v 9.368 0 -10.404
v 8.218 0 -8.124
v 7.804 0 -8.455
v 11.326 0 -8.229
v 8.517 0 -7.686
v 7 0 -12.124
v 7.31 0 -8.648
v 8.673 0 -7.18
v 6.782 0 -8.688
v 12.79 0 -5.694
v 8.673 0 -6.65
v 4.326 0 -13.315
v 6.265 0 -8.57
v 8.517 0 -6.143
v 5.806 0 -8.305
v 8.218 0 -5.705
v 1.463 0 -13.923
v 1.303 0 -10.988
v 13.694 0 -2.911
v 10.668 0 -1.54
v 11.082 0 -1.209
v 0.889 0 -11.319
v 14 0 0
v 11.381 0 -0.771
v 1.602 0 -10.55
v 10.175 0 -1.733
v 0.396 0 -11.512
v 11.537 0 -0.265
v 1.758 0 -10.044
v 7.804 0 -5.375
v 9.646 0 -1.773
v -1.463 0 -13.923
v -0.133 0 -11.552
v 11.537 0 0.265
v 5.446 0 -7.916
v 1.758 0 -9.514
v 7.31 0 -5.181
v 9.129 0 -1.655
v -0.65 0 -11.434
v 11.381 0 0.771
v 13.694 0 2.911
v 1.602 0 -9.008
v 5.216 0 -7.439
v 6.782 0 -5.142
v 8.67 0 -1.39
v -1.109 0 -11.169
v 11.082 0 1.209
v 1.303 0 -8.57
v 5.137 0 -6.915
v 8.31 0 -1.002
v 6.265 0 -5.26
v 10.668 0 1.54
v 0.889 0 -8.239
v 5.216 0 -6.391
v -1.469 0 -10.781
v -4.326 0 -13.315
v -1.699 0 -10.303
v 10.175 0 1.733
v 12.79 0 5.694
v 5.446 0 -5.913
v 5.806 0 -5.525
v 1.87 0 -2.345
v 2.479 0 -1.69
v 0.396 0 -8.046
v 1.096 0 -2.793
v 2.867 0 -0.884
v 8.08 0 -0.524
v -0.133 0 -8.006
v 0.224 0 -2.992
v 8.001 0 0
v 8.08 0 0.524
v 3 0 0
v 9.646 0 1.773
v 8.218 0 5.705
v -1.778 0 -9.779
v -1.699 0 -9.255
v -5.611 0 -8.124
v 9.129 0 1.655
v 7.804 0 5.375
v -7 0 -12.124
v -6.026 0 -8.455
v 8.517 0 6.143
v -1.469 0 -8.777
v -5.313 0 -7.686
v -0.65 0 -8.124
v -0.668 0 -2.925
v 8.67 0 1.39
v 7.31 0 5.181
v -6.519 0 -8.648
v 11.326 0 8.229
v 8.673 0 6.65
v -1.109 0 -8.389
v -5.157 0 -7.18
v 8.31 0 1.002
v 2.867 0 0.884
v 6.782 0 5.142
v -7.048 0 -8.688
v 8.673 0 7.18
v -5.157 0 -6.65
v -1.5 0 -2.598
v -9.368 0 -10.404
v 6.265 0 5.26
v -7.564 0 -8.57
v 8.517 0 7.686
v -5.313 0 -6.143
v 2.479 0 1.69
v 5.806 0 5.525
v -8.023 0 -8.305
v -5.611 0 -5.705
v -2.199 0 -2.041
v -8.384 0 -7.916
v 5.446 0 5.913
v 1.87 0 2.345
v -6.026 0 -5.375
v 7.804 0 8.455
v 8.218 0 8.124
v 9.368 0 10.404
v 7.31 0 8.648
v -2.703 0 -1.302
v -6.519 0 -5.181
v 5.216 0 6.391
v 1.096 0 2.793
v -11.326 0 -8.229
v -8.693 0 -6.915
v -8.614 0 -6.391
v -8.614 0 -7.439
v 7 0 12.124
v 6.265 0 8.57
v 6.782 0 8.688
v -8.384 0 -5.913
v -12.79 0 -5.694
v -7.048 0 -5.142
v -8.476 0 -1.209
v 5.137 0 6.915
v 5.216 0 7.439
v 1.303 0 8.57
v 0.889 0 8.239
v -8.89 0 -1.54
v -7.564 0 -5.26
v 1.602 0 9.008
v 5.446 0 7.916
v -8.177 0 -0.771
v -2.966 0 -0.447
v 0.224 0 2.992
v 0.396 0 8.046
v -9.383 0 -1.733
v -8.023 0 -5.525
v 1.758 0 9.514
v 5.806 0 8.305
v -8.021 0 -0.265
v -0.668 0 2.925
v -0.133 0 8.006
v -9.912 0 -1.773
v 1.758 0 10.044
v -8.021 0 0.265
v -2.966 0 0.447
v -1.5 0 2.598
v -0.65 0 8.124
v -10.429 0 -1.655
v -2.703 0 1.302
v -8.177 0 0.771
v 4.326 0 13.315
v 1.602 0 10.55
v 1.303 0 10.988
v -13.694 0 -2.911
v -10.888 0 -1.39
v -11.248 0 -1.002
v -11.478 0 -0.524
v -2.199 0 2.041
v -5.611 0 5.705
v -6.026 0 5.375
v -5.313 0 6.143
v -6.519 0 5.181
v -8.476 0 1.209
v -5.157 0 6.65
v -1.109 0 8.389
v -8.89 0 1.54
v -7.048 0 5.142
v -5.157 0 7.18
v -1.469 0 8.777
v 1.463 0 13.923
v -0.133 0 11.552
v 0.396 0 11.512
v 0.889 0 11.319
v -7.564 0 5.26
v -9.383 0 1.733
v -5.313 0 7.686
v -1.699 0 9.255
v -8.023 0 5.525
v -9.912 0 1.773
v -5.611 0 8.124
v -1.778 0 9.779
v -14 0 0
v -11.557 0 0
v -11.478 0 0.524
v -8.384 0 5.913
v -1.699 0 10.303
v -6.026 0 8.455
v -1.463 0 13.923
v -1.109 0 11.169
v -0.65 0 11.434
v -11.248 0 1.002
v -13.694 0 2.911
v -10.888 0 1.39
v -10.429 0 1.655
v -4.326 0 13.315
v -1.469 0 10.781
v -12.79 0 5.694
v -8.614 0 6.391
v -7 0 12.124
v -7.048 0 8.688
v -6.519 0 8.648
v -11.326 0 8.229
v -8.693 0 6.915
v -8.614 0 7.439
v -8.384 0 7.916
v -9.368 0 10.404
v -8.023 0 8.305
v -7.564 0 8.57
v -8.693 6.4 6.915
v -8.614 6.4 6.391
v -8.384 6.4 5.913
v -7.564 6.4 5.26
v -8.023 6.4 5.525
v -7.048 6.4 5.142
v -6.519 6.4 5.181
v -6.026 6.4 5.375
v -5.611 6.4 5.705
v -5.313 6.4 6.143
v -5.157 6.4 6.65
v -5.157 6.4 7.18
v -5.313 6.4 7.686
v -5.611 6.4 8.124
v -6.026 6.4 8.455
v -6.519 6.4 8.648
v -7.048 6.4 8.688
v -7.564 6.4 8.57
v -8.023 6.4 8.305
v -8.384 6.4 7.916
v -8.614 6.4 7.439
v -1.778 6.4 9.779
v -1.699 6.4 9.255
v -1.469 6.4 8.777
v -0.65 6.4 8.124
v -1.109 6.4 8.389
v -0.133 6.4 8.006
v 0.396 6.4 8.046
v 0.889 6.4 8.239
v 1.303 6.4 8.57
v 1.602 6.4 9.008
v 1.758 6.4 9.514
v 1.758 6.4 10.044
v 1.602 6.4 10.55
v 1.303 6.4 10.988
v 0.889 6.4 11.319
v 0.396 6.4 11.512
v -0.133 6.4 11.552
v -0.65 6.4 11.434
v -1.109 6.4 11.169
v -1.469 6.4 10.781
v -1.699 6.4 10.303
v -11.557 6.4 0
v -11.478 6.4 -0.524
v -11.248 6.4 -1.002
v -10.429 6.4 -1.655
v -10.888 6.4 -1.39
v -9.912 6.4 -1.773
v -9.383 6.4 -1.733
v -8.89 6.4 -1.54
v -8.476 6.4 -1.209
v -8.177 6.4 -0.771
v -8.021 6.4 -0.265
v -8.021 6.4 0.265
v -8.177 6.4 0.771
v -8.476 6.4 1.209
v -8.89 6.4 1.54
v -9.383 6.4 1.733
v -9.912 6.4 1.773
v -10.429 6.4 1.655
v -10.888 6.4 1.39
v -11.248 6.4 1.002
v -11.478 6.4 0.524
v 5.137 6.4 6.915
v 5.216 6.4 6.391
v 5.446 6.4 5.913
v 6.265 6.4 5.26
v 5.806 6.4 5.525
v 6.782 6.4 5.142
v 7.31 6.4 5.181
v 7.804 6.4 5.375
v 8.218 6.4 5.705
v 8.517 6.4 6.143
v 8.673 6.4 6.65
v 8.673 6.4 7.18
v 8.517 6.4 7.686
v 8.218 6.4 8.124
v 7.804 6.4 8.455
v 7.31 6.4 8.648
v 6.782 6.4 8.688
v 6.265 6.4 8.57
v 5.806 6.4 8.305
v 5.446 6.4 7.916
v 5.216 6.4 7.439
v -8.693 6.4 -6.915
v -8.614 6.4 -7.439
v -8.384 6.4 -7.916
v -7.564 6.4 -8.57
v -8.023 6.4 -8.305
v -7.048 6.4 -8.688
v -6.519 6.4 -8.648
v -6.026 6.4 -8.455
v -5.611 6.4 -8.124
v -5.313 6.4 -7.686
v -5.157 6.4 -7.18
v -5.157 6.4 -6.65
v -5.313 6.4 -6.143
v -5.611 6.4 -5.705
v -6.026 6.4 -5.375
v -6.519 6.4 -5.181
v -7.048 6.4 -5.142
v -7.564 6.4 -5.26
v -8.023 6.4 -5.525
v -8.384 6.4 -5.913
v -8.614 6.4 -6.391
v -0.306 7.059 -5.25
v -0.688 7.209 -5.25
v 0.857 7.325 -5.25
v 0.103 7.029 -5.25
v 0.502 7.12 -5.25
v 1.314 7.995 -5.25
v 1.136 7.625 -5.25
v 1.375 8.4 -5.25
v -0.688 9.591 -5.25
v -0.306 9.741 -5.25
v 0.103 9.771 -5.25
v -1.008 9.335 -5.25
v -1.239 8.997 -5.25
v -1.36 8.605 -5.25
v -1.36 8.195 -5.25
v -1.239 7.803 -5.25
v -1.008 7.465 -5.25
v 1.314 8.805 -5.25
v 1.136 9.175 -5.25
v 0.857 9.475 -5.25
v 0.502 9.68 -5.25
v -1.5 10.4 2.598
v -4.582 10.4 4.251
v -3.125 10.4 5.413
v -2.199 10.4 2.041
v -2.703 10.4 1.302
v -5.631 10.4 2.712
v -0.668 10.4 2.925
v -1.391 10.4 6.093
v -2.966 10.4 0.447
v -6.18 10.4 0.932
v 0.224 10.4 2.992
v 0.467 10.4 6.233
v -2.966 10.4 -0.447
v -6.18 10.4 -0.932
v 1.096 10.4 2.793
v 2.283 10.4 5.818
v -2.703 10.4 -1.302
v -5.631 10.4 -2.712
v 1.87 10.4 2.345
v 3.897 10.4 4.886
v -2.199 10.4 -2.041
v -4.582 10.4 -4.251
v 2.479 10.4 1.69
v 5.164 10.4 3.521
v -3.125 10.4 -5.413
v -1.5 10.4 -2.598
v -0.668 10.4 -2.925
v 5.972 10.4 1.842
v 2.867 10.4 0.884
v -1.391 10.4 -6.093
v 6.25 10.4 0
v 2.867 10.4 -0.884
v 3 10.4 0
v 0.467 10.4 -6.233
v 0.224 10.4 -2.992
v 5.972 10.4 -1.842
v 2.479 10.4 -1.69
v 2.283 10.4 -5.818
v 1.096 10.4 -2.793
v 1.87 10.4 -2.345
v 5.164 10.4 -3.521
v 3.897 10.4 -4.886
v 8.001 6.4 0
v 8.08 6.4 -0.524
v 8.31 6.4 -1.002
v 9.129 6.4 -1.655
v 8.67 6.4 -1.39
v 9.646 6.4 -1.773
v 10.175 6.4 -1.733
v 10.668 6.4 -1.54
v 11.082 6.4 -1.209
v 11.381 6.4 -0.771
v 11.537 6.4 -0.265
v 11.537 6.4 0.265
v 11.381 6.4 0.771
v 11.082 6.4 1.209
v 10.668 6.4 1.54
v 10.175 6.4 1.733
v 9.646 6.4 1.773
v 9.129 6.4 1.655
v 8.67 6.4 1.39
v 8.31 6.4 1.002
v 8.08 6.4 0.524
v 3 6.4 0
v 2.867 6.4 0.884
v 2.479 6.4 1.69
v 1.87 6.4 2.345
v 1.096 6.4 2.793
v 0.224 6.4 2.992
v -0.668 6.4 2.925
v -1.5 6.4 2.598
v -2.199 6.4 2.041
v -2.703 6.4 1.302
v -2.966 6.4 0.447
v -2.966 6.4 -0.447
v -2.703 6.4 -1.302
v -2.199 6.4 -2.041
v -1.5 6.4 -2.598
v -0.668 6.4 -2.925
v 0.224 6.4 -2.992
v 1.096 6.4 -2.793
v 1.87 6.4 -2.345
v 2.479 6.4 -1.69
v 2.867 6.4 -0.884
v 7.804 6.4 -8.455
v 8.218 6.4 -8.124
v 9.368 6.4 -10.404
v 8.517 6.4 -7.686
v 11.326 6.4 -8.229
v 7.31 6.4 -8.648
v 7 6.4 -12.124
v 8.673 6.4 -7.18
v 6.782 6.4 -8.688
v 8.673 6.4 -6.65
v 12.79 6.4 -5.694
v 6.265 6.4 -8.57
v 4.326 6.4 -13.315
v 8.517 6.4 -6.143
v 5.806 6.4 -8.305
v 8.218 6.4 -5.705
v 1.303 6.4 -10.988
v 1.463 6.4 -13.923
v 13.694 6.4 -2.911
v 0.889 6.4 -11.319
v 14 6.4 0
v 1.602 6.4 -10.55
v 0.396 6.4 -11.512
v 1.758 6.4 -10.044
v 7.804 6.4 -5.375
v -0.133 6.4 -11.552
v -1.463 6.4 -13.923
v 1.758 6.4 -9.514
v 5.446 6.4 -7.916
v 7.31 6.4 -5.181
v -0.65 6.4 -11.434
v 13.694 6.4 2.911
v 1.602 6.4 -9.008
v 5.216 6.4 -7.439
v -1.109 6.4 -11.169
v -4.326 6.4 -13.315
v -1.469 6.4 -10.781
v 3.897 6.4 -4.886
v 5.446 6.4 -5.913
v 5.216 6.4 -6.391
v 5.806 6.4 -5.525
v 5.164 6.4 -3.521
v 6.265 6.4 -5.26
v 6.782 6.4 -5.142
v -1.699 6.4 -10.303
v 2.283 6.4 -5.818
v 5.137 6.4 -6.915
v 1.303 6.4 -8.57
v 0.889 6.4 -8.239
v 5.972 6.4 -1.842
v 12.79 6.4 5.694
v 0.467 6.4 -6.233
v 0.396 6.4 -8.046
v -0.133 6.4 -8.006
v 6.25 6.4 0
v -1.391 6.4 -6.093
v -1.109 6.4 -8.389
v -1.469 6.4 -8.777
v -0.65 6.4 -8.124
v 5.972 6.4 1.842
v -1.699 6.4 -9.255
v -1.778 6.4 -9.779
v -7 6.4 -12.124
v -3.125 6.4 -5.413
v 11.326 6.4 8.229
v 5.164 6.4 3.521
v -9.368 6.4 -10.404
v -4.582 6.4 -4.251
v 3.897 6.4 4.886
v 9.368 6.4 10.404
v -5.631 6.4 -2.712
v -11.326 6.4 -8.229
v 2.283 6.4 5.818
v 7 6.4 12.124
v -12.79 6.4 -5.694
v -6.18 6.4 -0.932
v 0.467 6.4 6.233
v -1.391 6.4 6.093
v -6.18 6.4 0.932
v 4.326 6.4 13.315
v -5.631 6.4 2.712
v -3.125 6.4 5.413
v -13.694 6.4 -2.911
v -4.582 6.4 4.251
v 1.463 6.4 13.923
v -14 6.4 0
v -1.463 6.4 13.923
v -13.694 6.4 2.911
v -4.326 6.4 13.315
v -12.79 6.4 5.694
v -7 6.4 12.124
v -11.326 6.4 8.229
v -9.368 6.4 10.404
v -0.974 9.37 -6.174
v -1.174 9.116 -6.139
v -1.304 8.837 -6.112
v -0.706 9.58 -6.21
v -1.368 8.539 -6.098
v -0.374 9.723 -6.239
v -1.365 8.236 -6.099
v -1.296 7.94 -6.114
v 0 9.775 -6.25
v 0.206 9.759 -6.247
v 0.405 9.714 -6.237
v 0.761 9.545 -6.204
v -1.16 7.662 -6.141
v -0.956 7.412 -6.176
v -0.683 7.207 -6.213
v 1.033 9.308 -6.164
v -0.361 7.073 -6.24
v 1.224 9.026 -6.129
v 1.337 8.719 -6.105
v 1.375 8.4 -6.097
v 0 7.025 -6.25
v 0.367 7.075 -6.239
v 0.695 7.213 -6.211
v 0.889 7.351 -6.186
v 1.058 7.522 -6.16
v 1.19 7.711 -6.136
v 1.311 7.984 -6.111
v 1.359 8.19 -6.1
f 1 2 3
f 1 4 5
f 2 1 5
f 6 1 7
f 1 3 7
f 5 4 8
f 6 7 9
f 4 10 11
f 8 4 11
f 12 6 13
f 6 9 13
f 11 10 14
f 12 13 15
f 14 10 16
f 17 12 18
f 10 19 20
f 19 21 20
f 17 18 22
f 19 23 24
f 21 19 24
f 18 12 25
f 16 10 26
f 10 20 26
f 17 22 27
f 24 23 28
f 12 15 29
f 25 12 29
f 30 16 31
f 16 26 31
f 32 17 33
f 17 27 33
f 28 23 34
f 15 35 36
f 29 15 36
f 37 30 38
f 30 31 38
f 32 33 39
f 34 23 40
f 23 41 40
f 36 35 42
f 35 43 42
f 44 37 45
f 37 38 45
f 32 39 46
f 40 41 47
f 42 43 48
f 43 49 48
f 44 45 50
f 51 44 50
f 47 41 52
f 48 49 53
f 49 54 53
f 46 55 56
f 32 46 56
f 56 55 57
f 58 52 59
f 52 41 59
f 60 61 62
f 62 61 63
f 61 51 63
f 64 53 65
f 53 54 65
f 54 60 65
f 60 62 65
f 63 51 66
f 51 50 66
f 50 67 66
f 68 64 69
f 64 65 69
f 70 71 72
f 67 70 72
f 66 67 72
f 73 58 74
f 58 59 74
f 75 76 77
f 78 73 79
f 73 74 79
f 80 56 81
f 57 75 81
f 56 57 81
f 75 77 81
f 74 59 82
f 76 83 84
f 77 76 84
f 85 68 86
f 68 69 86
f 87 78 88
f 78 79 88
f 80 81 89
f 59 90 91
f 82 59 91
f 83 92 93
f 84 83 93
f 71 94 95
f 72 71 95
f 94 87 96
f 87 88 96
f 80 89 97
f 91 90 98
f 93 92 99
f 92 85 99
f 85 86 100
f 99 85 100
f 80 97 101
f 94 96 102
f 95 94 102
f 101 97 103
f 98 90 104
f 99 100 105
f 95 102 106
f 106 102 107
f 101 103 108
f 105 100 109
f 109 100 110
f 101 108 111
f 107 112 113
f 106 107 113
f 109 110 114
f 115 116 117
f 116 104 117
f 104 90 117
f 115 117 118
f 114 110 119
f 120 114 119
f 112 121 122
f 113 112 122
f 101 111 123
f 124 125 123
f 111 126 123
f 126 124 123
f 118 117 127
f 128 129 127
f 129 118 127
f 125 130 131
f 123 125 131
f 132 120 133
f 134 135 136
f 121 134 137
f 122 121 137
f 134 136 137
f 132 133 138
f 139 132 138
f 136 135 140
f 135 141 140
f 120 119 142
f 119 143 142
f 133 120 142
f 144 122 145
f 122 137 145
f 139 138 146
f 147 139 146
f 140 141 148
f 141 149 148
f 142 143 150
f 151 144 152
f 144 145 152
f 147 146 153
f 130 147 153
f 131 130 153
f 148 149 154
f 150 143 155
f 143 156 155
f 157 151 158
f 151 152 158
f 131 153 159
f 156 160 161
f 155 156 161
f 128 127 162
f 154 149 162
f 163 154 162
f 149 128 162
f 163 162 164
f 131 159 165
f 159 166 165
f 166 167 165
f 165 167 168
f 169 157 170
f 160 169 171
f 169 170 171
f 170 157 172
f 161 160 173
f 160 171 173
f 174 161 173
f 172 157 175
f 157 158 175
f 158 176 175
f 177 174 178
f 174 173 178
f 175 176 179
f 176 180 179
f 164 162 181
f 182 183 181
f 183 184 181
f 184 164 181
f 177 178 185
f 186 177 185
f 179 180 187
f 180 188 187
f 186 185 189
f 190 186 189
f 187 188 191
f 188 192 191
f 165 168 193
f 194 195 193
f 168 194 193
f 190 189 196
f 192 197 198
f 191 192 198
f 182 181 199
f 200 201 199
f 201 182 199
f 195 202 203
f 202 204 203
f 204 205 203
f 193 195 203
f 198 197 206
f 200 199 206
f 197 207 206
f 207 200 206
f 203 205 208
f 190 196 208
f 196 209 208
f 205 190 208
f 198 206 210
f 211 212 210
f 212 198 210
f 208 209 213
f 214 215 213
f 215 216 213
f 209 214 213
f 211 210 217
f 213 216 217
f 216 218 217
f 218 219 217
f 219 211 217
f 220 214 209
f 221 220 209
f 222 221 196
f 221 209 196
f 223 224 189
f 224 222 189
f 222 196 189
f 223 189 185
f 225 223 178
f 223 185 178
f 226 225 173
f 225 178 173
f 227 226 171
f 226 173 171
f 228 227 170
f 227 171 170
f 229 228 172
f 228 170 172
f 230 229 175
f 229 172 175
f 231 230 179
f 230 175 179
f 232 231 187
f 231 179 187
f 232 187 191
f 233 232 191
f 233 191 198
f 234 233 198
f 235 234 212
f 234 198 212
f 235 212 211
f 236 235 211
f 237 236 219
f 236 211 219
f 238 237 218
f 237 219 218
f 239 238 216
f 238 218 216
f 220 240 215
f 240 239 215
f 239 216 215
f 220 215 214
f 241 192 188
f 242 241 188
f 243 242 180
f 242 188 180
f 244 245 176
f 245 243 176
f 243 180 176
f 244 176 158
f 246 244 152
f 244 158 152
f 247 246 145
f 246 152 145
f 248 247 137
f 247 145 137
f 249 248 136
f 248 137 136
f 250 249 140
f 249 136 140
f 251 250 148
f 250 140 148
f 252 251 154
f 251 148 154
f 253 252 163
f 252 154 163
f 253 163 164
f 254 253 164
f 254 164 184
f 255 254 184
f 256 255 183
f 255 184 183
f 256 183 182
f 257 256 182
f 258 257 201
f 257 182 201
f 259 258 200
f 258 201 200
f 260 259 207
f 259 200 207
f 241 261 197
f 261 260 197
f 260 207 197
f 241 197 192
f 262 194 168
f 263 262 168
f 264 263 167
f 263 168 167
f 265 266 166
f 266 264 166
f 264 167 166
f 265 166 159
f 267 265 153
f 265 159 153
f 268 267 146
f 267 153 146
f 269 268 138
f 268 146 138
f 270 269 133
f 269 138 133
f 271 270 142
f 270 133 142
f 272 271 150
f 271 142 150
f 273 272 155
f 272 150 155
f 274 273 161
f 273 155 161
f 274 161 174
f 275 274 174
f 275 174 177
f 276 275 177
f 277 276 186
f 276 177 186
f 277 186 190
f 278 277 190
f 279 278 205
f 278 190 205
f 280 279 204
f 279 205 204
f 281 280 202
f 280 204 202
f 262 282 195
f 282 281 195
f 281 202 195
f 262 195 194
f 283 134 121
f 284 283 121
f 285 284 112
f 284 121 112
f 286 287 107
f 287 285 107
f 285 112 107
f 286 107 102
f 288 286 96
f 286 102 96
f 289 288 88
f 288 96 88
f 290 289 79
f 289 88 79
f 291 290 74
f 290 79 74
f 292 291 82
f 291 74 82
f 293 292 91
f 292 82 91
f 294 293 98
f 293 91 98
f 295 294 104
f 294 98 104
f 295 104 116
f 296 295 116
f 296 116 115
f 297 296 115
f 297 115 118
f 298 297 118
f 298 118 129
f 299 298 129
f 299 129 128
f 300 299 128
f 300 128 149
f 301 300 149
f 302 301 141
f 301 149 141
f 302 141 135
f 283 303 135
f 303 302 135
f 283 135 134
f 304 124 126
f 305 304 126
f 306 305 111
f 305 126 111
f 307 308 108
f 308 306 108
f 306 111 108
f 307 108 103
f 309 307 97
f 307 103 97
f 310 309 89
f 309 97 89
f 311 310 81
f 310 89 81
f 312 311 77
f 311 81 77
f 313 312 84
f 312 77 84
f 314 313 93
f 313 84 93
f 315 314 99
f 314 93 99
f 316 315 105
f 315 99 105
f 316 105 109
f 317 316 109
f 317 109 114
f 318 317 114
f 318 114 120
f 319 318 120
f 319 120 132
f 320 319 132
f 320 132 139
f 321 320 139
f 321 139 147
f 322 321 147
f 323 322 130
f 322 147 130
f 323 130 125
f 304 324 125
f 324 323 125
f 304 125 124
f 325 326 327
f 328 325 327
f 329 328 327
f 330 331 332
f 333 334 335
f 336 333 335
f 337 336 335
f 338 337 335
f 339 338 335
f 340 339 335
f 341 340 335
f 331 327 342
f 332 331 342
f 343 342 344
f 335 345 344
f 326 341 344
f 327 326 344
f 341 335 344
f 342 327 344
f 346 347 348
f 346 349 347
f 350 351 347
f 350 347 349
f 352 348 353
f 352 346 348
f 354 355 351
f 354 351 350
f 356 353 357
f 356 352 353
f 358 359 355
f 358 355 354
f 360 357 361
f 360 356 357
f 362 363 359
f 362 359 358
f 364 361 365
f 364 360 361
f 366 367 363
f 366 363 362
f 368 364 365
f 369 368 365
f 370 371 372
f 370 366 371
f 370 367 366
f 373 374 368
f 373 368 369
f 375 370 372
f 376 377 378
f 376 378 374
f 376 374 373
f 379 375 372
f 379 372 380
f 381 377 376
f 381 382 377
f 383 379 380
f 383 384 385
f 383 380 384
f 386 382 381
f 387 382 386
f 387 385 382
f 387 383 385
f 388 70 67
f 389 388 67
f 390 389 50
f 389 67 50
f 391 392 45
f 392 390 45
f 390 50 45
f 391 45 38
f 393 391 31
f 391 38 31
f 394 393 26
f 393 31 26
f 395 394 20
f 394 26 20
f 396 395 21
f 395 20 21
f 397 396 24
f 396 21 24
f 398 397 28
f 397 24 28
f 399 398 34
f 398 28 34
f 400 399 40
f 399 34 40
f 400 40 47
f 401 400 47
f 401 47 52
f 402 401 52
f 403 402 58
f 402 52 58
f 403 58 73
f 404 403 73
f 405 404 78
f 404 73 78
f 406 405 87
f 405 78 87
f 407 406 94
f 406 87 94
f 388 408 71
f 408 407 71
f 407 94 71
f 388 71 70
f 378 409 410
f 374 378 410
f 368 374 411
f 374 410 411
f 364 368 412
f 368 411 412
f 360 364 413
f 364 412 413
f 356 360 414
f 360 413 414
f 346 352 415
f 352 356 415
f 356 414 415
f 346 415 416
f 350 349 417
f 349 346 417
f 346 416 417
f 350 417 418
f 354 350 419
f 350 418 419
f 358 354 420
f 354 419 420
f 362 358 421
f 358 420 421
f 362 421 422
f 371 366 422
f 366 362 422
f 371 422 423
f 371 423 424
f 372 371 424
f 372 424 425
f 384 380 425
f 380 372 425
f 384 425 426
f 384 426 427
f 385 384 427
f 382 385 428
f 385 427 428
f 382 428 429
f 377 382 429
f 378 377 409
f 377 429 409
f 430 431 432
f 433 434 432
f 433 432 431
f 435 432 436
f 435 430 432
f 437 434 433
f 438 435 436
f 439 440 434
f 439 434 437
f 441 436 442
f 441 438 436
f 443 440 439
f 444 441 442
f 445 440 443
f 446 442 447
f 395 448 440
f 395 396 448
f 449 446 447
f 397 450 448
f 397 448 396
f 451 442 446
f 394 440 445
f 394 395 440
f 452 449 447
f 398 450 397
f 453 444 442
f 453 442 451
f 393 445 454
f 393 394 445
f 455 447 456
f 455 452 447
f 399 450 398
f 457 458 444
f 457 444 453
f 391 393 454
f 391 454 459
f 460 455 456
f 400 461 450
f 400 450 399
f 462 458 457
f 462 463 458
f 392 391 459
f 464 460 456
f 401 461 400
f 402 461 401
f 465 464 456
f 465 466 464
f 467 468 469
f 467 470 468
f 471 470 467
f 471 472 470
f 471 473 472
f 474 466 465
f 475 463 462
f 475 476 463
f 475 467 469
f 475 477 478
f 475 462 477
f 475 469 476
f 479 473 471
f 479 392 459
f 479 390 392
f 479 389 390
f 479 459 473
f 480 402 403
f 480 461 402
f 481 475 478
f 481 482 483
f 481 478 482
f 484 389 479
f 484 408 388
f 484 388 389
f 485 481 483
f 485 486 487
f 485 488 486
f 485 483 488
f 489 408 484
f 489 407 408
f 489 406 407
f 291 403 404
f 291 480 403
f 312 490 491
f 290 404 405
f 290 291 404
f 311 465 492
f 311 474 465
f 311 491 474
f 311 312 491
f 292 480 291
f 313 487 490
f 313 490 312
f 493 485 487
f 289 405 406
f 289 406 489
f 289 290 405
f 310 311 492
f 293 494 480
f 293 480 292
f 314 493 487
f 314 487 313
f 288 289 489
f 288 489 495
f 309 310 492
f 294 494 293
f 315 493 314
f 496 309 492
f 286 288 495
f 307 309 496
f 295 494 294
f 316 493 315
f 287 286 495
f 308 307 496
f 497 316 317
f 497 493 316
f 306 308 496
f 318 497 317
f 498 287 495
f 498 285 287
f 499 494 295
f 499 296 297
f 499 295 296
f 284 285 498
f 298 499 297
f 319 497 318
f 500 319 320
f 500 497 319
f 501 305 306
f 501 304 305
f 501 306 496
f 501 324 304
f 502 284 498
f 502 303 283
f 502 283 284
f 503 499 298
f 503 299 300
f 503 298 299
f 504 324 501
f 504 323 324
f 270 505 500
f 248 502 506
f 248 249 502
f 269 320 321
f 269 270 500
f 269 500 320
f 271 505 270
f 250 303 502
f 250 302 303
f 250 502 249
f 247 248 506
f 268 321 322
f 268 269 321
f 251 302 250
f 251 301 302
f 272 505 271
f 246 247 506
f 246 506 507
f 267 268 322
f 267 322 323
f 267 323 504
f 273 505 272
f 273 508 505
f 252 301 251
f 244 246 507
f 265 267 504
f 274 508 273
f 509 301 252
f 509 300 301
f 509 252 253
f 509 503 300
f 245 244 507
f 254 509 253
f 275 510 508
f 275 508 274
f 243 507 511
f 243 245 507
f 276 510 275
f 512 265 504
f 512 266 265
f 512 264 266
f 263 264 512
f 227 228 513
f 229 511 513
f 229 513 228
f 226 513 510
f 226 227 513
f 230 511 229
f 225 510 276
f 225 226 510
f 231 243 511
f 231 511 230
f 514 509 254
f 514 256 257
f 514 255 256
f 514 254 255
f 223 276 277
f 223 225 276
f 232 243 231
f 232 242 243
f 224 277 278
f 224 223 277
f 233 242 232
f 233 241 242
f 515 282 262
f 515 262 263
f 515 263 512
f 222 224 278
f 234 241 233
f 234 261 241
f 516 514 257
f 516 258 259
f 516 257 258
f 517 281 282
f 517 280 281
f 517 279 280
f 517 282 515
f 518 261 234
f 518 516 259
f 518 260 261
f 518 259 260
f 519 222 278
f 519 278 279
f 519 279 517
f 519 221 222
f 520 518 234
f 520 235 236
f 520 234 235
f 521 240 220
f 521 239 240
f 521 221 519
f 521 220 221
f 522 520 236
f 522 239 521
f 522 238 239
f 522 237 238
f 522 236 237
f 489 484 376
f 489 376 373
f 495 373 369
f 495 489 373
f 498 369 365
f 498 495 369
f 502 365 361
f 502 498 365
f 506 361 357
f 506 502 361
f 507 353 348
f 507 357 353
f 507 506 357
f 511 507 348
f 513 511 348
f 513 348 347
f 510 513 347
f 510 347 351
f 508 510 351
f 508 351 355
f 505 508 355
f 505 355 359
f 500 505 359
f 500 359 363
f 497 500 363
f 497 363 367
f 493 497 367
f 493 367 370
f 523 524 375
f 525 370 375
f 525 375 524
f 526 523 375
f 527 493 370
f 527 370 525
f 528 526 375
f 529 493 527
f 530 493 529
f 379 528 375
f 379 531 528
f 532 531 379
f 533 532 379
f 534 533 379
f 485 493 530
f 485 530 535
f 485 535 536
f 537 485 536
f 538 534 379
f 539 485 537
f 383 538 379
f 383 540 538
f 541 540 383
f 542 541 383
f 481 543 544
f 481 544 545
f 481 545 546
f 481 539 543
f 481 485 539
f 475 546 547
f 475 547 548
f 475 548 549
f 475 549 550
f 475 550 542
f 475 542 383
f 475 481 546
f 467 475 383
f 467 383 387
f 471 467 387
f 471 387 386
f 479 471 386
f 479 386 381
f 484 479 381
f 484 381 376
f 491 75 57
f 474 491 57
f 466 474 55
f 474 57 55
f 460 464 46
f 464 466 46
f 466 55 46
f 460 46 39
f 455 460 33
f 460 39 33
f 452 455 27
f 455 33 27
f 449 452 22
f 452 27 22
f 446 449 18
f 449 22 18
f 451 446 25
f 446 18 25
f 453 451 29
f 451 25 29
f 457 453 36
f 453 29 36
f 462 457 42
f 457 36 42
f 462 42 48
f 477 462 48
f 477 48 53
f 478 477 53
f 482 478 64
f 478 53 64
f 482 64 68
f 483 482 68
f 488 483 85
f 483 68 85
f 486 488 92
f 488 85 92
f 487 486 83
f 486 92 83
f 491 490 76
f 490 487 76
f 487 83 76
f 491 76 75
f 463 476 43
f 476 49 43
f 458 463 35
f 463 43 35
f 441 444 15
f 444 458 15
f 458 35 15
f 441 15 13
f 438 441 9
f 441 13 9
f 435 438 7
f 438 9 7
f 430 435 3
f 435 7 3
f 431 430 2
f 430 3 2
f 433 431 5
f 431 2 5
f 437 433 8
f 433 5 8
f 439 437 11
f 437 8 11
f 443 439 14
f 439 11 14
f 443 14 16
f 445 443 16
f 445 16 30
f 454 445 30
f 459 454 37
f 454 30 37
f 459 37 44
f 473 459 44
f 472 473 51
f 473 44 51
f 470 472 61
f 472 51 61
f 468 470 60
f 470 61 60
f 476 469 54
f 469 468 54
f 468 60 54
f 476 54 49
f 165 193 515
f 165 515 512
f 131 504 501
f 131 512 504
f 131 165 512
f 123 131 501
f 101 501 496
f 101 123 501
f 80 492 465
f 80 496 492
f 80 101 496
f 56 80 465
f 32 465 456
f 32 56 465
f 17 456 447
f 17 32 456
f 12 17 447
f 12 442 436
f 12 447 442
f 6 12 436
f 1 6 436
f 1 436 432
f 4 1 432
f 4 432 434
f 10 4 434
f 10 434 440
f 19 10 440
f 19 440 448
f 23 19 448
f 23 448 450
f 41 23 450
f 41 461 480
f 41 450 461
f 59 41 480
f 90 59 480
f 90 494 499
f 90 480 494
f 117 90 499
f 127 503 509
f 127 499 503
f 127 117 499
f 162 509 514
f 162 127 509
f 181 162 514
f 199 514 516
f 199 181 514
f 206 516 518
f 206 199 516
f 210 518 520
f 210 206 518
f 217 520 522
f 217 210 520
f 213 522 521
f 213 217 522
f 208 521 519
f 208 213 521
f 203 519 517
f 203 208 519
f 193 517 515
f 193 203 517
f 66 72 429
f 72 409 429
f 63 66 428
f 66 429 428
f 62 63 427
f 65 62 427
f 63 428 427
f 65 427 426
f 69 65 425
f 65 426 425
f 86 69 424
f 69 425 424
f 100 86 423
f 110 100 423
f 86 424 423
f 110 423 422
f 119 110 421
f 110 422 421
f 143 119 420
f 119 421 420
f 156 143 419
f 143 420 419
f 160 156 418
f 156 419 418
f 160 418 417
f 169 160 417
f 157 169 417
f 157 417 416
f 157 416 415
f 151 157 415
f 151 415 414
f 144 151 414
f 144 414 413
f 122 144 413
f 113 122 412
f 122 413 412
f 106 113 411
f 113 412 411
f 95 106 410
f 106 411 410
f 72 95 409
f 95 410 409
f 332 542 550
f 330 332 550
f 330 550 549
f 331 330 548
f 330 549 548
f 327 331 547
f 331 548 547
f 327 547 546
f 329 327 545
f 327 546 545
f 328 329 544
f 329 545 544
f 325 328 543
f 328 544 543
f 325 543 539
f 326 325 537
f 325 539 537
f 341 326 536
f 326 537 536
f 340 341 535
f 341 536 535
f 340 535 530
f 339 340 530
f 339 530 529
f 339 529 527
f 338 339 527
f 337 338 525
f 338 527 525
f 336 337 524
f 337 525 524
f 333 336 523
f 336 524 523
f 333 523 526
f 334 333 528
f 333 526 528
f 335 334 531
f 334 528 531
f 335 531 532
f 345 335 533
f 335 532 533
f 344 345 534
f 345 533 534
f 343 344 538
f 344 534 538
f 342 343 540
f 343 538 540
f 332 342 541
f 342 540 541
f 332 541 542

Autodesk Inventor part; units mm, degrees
ref_plane "YZ Plane" through (0, 0, 0) normal (1, 0, 0) x (0, 1, 0)
ref_plane "XZ Plane" through (0, 0, 0) normal (0, 1, 0) x (-1, 0, 0)
sketch "Sketch1" plane through (0, 0, 0) normal (0, 1, 0) x (-1, 0, 0)
  circle A0 centre (0, 0) radius 14
  line L0 (0, 0) -> (9.779, 0) construction
  circle A1 centre (9.779, 0) radius 1.778
  circle A2 centre (6.9148, 6.9148) radius 1.778
  circle A3 centre (0, 9.779) radius 1.778
  circle A4 centre (-6.9148, 6.9148) radius 1.778
  circle A5 centre (-9.779, 0) radius 1.778
  circle A6 centre (-6.9148, -6.9148) radius 1.778
  circle A7 centre (0, -9.779) radius 1.778
  circle A8 centre (6.9148, -6.9148) radius 1.778
  dimension "d0" = 28
  dimension "d1" = 9.779
  dimension "d2" = 3.556
  dimension "d5" = 360
extrude "Extrusion1" add sketch "Sketch1" along normal blind 6.4
sketch "Sketch2" plane through (0, 6.4, 0) normal (0, 1, 0) x (1, 0, 0)
  circle A0 centre (0, 0) radius 6.25
  circle A1 centre (0, 0) radius 3
  dimension "d9" = 12.5
  dimension "d10" = 6
extrude "Extrusion2" add sketch "Sketch2" along normal blind 4
ref_plane "Work Plane1" through (0, 6.4, -6.25) normal (0, 0, 1) x (1, 0, 0)
sketch "Sketch3" plane through (0, 6.4, -6.25) normal (0, 0, 1) x (1, 0, 0)
  line L0 (-3, 4) -> (3, 4) construction
  line L1 (0, 4) -> (0, 0) construction
  line L2 (-1.778, 0) -> (1.778, 0) construction
  circle A0 centre (0, 2) radius 1.375
  point P0 (0, -6.4)
  dimension "d13" = 2.75
extrude "Extrusion3" cut sketch "Sketch3" along normal blind 1
sketch "Sketch4" plane through (0, 6.4, 0) normal (0, 1, 0) x (1, 0, 0)
  circle A0 centre (0, 0) radius 3 projected
extrude "Extrusion4" cut sketch "Sketch4" against normal through all
properties part number "Main Motor to Sprocket Adapter"
